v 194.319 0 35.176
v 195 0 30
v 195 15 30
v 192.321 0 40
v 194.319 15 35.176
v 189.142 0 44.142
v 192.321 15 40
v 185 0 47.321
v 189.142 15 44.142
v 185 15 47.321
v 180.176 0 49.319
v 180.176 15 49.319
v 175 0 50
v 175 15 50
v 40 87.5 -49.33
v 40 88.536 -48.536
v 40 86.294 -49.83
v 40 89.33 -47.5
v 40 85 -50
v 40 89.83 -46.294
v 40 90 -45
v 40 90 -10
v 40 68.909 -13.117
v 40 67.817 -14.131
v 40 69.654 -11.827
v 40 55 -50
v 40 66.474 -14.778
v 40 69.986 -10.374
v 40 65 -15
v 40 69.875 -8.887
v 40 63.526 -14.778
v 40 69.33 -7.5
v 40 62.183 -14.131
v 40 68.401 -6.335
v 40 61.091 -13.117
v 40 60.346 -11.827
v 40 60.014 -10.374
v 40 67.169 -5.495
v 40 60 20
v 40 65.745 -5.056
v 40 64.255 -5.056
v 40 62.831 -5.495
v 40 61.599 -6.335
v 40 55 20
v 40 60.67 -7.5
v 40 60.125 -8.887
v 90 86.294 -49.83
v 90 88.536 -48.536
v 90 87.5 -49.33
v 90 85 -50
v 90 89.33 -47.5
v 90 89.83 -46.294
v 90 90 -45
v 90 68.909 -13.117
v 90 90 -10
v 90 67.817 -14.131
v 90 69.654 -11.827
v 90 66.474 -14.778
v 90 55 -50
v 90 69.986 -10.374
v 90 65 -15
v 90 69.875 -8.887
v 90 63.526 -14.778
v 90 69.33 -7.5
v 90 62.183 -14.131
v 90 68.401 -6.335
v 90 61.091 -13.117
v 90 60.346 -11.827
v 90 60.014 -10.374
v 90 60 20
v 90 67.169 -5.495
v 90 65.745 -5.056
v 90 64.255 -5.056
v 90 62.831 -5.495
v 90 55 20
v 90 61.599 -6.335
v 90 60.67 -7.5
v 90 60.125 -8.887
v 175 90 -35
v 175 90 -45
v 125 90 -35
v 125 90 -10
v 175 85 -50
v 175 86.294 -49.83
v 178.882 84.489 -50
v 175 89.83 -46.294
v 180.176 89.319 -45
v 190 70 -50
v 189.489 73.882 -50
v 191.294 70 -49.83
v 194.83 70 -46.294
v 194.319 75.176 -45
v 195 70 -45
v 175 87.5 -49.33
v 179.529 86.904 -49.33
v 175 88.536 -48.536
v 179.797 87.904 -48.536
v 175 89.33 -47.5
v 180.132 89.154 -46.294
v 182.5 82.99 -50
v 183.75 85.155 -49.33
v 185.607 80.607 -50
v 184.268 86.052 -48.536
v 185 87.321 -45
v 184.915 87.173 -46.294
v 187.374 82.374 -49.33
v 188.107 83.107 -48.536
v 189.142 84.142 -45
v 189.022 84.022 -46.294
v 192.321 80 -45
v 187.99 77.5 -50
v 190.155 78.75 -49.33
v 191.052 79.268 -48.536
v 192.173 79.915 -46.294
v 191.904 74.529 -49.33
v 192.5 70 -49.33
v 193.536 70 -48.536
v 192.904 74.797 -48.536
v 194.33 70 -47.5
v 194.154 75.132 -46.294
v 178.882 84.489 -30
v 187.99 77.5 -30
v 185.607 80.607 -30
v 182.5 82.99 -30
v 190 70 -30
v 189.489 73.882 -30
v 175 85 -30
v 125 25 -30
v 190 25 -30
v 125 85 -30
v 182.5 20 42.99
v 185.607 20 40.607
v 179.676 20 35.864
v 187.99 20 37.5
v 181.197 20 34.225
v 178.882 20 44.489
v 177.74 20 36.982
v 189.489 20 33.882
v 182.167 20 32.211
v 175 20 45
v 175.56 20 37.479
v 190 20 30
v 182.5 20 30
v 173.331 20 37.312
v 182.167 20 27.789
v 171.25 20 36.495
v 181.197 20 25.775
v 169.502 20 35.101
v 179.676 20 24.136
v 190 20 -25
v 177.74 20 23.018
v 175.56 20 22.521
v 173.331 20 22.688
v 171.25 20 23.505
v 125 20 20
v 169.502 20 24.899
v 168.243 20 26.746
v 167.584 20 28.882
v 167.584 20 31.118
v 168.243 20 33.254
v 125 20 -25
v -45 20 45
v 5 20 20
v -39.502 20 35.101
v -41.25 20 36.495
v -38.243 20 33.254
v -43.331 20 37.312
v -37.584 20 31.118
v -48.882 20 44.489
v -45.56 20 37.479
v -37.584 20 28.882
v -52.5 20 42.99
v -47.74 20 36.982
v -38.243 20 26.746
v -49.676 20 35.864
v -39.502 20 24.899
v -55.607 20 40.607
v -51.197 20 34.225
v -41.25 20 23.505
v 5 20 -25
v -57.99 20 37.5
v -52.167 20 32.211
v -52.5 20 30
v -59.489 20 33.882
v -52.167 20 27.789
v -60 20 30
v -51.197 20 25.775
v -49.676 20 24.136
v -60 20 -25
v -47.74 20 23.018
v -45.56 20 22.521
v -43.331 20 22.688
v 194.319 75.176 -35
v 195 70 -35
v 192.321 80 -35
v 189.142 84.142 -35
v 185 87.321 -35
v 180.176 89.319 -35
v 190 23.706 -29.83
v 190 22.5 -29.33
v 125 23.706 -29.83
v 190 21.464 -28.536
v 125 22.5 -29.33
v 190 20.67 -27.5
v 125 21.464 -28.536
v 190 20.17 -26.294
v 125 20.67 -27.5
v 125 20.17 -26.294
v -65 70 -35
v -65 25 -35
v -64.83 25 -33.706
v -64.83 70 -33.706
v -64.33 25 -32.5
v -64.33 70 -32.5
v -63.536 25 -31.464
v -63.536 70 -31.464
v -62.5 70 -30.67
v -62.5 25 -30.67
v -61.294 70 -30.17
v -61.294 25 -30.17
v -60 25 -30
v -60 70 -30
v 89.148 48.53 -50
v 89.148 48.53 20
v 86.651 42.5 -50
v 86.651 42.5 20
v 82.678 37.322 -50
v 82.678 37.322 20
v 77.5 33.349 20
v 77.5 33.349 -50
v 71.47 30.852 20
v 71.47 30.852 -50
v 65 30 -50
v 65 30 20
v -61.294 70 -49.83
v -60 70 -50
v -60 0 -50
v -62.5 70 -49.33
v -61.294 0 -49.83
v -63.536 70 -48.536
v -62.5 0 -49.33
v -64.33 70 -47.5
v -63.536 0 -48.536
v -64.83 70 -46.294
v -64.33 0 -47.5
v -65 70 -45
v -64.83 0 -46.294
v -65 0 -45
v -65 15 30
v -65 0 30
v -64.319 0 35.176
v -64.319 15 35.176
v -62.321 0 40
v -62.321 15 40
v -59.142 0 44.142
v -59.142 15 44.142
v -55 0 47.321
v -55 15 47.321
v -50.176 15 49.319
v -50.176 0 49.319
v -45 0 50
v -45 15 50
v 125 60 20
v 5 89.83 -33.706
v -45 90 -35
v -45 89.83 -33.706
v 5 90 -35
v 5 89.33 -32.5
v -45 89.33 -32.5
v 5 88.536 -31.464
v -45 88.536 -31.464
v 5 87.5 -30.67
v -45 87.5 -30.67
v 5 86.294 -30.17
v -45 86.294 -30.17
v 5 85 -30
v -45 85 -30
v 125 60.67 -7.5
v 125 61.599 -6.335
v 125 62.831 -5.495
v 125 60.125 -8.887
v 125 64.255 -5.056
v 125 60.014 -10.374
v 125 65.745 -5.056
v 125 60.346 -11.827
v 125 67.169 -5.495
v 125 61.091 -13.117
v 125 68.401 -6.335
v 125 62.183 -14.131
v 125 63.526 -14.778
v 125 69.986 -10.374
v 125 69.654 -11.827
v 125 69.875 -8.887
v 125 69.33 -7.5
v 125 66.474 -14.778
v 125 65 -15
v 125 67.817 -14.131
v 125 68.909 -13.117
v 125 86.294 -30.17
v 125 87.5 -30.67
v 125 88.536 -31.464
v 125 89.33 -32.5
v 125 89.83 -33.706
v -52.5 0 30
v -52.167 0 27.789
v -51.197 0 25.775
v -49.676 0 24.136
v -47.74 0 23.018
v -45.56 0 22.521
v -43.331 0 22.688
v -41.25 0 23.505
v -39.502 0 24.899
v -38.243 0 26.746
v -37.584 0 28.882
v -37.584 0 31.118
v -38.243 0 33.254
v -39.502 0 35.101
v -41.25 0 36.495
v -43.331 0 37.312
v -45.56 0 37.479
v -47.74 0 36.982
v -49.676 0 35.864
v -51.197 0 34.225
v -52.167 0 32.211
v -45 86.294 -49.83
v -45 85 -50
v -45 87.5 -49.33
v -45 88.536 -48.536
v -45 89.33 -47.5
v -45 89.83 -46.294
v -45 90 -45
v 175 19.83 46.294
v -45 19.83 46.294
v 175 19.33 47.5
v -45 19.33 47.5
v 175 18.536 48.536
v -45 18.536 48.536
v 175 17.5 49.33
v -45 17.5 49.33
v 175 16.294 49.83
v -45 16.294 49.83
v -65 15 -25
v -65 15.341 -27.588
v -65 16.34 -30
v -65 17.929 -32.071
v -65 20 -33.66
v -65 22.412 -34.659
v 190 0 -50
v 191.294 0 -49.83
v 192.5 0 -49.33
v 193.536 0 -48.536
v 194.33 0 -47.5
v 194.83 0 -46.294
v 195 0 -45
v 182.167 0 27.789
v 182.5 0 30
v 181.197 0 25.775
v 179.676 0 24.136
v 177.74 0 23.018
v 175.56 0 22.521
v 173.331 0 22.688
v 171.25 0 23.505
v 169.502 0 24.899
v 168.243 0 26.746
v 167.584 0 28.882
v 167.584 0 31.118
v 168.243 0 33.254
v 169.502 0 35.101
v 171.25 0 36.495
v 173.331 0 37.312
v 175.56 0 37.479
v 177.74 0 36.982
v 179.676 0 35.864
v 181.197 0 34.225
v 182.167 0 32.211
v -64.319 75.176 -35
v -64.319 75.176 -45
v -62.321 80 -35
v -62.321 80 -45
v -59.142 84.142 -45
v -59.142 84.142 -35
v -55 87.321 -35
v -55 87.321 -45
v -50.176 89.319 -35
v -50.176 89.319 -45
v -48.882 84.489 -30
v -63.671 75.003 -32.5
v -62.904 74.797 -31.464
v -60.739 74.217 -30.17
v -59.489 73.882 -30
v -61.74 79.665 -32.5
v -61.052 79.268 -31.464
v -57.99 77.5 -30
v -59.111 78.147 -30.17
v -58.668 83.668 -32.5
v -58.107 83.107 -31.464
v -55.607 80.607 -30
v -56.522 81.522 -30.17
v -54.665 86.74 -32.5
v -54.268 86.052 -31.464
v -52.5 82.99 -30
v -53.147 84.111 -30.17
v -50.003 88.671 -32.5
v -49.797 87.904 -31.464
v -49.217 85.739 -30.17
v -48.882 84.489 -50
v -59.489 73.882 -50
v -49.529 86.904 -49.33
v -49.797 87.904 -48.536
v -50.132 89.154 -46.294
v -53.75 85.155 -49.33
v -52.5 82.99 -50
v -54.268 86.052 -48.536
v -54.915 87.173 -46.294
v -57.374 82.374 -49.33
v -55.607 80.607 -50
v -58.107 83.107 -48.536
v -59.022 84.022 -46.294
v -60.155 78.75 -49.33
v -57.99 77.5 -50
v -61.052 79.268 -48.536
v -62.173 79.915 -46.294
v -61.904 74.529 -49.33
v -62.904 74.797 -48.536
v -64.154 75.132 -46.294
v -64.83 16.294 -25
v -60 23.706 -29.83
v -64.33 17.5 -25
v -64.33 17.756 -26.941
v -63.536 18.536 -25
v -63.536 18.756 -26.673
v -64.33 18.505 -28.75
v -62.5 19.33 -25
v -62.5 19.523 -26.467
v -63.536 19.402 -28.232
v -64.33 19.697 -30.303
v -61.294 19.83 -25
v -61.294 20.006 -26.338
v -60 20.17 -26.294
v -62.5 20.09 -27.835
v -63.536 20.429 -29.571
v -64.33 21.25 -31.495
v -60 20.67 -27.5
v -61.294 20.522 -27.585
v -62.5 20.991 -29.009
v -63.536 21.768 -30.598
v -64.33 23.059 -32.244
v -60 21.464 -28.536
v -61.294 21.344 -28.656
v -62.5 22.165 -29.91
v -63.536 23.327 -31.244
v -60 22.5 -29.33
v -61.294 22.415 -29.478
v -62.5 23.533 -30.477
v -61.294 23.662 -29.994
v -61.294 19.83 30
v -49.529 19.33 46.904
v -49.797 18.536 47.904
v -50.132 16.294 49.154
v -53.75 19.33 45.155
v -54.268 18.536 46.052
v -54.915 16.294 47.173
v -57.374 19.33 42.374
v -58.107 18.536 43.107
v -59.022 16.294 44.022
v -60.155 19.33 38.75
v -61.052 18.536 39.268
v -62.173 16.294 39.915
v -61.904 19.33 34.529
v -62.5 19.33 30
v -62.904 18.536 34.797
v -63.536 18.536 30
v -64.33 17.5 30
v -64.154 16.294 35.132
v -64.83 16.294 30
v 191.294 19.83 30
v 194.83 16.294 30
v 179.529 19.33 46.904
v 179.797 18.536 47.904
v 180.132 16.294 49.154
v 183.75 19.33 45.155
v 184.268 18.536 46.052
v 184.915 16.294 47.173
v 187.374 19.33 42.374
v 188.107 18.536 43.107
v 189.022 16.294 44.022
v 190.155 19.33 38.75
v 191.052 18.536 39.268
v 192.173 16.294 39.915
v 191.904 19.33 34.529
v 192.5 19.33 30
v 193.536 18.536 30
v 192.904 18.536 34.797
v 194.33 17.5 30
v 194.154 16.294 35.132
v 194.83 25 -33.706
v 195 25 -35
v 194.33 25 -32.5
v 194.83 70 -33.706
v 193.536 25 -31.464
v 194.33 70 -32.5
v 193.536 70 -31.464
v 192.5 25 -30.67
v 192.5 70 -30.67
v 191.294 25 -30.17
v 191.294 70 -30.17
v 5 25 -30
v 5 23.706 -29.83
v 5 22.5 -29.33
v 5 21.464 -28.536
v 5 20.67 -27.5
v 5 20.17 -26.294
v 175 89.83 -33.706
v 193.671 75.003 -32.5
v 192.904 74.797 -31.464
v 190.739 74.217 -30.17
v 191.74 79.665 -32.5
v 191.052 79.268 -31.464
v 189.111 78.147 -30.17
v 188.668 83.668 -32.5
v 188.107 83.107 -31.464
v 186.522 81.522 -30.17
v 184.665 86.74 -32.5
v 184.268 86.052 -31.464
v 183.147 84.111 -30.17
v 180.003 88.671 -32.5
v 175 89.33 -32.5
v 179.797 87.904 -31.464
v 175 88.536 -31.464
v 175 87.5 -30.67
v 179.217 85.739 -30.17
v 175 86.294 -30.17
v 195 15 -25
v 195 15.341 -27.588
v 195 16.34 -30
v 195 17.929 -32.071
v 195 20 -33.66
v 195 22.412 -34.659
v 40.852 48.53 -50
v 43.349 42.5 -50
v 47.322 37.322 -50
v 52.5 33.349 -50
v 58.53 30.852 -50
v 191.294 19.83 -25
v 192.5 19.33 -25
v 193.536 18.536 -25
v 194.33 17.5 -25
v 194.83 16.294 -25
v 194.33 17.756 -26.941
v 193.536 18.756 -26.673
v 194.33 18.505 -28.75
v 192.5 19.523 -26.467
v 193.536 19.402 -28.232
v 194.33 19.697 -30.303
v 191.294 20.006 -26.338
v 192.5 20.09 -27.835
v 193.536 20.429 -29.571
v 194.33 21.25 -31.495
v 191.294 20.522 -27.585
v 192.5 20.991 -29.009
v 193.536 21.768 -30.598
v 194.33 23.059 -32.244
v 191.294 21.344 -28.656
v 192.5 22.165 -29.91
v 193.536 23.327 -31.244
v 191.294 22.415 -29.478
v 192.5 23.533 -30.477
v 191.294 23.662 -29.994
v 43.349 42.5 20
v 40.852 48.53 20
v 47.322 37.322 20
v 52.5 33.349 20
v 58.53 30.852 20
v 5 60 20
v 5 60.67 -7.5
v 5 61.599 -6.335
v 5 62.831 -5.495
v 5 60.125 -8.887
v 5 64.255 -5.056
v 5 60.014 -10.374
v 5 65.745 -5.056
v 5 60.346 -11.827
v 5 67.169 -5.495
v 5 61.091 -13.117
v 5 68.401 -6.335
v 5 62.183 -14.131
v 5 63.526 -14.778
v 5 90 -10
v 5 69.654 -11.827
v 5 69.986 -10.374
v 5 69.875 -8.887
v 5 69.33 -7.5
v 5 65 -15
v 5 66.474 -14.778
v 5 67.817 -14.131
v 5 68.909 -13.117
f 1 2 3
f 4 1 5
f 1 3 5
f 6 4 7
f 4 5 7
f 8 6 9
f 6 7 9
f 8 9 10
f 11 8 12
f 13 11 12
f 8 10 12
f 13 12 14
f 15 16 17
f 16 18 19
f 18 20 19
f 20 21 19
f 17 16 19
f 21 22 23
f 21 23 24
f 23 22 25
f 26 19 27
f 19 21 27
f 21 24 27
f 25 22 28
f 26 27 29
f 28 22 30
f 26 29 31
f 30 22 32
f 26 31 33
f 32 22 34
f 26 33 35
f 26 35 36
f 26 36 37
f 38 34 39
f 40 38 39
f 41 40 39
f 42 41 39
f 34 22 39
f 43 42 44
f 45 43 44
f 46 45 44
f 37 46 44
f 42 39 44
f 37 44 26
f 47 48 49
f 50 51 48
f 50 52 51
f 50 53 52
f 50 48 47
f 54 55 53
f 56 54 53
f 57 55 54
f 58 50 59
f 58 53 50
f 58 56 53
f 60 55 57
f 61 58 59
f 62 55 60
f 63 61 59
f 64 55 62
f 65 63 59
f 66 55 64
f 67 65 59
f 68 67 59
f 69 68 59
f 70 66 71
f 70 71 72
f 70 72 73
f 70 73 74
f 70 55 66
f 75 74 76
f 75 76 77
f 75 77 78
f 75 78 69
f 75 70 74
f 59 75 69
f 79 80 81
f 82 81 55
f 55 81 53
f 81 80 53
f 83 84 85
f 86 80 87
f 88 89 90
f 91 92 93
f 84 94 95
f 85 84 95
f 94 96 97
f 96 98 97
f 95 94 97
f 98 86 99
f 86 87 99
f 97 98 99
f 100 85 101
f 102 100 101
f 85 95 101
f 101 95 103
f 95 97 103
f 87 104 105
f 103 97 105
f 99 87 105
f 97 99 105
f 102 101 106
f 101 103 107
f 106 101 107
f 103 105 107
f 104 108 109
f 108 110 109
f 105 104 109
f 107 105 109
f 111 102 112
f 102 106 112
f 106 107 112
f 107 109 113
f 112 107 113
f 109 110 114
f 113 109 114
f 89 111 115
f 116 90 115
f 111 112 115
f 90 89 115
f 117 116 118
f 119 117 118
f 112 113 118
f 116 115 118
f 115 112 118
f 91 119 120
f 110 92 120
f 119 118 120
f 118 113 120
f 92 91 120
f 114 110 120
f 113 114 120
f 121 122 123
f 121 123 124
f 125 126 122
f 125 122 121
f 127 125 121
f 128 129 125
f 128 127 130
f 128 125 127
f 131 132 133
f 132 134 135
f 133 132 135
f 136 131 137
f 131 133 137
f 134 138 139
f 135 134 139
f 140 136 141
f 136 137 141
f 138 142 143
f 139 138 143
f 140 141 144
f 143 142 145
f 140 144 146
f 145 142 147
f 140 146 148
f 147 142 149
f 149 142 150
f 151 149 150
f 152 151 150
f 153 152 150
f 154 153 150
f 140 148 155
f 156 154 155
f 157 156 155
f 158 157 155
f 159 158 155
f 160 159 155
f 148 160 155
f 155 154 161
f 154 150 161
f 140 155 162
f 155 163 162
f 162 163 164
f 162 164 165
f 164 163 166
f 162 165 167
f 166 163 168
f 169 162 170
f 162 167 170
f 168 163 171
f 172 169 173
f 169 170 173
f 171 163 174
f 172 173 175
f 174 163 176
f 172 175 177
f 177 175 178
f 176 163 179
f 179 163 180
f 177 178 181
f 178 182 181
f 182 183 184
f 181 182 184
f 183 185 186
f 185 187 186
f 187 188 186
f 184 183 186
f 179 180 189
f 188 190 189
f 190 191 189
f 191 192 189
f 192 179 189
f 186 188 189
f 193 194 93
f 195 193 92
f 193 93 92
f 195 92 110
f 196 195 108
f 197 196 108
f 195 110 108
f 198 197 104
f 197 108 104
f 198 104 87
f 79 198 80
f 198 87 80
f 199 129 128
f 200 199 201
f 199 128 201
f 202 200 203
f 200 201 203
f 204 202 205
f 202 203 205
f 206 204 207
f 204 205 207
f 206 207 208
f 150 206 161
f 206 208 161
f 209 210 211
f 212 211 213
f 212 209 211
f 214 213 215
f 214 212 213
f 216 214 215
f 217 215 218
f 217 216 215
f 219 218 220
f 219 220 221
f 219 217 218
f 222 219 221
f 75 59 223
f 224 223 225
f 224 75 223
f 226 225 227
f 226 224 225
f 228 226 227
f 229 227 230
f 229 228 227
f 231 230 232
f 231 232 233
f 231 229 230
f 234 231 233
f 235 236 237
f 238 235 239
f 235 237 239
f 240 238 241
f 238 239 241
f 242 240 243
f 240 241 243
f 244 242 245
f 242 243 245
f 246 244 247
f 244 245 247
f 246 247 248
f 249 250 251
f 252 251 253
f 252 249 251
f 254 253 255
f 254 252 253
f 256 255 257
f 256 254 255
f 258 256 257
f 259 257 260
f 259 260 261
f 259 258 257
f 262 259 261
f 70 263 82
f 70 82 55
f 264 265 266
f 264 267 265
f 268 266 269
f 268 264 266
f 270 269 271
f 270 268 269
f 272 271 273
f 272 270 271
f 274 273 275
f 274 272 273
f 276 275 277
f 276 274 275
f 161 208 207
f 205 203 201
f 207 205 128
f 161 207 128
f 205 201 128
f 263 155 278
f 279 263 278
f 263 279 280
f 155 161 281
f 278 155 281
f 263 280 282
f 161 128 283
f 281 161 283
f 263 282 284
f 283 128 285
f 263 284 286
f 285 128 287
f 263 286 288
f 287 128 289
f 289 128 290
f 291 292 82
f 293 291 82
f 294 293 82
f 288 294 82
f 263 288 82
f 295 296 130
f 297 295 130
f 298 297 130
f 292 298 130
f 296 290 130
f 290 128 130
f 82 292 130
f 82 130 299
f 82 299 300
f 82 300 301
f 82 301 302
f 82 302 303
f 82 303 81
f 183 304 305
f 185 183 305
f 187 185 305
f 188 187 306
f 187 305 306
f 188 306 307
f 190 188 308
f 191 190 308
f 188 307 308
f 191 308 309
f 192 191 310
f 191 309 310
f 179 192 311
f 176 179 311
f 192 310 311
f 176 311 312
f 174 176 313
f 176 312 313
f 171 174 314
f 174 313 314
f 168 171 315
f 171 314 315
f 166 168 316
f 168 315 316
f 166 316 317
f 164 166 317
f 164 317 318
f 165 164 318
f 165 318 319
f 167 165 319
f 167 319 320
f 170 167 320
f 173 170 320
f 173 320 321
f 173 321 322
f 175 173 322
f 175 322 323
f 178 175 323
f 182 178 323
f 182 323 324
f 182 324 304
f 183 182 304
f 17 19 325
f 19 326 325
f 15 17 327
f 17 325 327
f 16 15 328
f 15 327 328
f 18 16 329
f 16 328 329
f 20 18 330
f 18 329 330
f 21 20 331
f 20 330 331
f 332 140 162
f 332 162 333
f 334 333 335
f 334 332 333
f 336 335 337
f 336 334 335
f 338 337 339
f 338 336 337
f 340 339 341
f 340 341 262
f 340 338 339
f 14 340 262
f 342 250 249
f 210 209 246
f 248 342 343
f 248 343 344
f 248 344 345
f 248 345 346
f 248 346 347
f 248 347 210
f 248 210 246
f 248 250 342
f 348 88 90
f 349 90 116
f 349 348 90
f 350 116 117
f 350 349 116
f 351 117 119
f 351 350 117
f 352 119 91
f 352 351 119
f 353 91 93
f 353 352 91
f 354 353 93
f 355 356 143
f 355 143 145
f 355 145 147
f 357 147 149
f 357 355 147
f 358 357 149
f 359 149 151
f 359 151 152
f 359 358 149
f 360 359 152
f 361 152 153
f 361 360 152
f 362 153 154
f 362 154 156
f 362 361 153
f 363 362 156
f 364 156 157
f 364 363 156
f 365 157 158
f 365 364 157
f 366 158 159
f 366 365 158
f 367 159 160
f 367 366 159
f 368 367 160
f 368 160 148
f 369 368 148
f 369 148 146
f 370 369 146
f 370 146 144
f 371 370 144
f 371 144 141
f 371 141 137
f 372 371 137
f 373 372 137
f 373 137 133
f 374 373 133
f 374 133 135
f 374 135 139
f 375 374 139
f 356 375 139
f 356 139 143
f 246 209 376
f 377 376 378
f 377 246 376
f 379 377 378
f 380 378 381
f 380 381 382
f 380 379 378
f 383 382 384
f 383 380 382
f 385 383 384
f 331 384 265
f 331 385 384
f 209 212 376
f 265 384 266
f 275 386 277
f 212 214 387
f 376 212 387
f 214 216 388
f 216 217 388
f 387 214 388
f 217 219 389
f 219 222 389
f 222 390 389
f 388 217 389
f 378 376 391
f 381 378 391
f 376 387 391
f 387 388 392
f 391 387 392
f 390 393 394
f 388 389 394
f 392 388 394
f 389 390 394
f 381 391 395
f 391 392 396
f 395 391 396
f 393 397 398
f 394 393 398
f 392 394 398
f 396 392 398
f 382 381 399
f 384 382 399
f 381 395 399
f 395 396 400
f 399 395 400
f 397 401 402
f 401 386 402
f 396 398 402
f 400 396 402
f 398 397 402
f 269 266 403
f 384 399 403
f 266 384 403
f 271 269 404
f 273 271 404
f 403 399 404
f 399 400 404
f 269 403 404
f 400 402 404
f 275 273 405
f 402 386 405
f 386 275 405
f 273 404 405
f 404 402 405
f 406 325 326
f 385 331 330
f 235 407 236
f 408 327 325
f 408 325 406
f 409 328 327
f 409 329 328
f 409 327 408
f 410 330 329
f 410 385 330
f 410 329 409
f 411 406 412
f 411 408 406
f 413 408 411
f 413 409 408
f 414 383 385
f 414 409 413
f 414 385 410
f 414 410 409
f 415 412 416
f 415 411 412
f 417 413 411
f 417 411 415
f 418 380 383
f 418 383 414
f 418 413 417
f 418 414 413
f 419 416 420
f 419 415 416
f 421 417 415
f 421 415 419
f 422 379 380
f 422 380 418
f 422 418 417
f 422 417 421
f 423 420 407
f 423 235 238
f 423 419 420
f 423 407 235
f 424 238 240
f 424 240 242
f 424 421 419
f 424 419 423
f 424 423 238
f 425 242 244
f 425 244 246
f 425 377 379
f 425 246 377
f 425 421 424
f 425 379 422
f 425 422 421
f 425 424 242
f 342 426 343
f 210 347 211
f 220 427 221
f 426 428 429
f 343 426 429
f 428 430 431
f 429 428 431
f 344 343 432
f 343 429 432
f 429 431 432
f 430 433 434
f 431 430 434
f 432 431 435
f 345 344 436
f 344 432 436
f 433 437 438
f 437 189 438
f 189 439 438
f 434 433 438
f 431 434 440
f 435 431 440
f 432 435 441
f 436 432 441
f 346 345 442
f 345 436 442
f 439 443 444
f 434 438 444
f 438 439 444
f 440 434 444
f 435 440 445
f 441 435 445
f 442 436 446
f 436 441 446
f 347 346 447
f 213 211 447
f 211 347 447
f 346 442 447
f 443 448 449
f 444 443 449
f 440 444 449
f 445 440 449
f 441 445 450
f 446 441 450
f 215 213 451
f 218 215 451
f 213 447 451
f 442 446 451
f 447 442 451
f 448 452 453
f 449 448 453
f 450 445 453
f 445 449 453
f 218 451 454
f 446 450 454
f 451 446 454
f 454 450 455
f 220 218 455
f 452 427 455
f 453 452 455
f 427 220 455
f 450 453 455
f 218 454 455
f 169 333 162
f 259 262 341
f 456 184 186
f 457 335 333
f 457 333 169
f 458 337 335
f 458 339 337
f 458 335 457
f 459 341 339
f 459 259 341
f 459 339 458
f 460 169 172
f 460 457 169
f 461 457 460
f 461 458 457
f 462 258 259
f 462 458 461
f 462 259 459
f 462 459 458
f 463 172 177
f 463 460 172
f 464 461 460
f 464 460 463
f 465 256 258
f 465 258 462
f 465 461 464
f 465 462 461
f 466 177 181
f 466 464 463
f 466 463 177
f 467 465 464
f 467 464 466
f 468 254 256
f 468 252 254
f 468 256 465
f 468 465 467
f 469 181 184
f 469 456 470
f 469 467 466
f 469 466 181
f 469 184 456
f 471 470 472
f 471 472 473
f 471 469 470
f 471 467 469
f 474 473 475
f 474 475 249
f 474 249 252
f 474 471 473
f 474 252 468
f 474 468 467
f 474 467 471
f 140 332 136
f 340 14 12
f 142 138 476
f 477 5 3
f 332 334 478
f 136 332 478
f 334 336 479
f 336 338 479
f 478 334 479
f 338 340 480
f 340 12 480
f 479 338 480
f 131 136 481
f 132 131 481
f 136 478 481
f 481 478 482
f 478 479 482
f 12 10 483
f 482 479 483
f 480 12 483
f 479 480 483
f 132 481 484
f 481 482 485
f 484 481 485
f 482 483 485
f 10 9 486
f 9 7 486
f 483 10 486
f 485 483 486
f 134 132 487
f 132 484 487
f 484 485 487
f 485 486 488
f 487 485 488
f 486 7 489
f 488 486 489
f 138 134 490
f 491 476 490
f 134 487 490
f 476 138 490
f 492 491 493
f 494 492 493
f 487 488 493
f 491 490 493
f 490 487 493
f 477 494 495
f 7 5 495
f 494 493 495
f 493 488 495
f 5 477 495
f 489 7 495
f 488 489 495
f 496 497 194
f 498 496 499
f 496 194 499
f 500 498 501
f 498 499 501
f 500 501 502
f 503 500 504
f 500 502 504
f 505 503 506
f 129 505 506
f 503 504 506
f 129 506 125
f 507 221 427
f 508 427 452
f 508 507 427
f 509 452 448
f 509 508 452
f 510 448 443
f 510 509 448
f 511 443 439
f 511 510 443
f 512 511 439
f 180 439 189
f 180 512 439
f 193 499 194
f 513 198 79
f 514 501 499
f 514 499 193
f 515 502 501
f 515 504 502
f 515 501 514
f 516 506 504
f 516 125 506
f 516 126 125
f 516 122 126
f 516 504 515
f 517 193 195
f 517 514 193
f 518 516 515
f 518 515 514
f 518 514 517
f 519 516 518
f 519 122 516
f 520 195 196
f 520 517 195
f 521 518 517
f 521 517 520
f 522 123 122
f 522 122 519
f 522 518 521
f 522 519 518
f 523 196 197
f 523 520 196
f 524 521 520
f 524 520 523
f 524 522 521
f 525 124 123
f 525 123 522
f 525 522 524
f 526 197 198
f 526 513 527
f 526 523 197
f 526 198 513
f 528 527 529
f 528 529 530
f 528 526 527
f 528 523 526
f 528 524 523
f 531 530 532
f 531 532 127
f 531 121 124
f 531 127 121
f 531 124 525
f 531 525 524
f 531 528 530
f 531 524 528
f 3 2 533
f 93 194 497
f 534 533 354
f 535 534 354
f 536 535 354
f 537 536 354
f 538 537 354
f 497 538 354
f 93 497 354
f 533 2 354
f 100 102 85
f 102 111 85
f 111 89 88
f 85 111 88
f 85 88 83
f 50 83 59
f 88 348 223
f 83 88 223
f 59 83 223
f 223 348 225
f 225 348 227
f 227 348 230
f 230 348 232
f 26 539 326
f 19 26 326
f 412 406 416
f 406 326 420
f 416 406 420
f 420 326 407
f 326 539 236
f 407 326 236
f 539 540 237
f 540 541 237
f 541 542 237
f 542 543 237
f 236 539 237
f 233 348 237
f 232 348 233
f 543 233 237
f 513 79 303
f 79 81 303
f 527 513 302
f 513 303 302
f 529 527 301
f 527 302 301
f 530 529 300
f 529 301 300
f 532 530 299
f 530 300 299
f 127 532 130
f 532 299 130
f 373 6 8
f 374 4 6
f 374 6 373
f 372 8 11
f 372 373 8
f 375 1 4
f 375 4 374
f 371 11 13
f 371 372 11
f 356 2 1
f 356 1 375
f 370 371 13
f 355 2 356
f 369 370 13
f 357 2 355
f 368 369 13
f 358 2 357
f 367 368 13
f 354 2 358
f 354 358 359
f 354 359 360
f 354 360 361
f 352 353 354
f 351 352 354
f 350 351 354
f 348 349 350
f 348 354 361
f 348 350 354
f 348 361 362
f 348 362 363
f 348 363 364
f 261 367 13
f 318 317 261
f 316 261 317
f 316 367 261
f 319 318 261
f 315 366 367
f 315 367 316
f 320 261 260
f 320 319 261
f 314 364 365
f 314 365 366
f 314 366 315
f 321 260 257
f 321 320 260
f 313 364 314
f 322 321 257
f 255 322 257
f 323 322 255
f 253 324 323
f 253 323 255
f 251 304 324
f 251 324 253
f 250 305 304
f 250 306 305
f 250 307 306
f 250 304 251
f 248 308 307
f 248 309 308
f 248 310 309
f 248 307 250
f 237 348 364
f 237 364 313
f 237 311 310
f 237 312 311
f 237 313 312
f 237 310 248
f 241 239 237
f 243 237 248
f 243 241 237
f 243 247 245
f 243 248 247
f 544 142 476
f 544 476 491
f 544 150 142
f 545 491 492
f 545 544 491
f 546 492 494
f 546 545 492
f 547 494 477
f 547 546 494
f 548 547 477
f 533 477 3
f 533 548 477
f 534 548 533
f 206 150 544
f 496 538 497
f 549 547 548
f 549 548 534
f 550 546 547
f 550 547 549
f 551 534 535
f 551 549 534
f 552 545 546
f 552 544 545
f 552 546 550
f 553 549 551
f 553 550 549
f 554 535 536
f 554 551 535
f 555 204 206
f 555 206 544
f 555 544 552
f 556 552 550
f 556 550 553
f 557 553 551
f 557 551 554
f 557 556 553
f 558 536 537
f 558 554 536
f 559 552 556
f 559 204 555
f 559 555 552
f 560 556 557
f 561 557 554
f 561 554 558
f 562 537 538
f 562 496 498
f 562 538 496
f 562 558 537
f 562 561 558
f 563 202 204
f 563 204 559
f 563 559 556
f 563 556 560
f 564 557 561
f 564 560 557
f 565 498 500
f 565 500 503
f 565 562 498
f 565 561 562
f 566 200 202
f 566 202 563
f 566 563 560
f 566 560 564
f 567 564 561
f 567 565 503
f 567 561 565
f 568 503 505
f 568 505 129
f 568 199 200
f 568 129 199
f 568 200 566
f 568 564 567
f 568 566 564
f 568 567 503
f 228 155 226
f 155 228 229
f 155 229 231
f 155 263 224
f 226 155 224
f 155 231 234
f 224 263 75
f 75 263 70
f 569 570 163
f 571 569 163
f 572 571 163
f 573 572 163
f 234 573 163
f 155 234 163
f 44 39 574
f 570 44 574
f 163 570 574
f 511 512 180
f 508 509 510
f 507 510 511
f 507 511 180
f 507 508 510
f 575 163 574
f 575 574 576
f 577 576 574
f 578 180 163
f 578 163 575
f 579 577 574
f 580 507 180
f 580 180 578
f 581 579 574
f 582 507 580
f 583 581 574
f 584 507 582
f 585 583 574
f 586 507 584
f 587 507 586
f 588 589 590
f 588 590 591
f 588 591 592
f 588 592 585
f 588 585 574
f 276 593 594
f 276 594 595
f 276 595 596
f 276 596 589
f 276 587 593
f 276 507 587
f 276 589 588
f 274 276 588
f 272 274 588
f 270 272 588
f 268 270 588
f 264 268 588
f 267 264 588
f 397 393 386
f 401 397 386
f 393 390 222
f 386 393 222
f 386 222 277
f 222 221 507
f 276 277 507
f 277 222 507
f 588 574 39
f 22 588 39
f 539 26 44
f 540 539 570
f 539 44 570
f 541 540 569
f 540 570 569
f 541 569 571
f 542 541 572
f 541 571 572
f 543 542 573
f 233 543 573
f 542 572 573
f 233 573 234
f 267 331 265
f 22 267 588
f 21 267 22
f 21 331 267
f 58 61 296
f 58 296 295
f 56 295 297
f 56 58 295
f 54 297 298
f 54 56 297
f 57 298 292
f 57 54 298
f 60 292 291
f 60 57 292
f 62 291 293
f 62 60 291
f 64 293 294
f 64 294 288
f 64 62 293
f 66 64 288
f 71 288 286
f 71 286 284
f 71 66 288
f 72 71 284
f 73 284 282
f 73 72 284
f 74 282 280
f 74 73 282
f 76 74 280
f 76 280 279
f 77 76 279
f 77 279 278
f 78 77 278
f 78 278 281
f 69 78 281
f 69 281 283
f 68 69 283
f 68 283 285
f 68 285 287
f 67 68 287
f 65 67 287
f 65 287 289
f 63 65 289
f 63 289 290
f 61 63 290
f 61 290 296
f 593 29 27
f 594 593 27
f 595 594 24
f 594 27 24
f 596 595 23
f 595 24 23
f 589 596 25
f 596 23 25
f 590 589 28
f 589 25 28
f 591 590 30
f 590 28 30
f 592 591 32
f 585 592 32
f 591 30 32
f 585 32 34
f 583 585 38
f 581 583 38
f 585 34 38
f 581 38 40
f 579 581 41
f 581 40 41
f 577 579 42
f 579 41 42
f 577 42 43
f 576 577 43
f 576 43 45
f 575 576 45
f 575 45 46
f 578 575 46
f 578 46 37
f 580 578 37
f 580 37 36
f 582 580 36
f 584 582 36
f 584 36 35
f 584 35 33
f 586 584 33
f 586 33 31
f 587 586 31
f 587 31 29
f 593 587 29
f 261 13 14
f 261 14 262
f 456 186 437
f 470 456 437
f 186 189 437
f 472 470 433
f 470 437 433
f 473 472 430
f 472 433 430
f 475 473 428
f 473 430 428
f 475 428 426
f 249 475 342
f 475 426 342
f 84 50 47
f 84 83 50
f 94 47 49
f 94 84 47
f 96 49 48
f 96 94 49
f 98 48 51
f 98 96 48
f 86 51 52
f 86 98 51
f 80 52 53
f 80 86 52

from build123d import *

# Parameters (mm, degrees)
SKETCH1_W                  = 130
SKETCH1_H                  = 100
BOSS_EXTRUDE1_DEPTH        = 20
SKETCH2_W                  = 130
SKETCH2_H                  = 20
BOSS_EXTRUDE2_DEPTH        = 70
FILLET1_R                  = 20
SKETCH3_W                  = 60
SKETCH3_H                  = 70
BOSS_EXTRUDE3_DEPTH        = 50
CUT_EXTRUDE1_DEPTH         = 132.244047484
CHAMFER1_SIZE              = 30
F_10_0_10_DIAMETER_HOLE1_D = 10
F_15_0_15_DIAMETER_HOLE1_D = 15
FILLET2_R                  = 5


with BuildPart() as part:
    # Sketch1 → Boss-Extrude1 (new body)
    with BuildSketch(Plane(origin=(0, 0, 0), x_dir=(1, 0, 0), z_dir=(0, 1, 0))):
        Rectangle(SKETCH1_W, SKETCH1_H)
    extrude(amount=BOSS_EXTRUDE1_DEPTH)

    # Sketch2 → Boss-Extrude2 (add)
    with BuildSketch(Plane(origin=(0, 20, 0), x_dir=(1, 0, 0), z_dir=(0, 1, 0))):
        with Locations((0, 40)):
            Rectangle(SKETCH2_W, SKETCH2_H)
    extrude(amount=BOSS_EXTRUDE2_DEPTH)

    # Fillet1
    fillet1_edges = [part.edges().sort_by_distance(p)[0] for p in [
        (-65, 10, 50),
        (-65, 90, -40),
    ]]
    fillet(fillet1_edges, radius=FILLET1_R)

    # Sketch3 → Boss-Extrude3 (add)
    with BuildSketch(Plane.XY.offset(-30)):
        with Locations((35, 55)):
            Rectangle(SKETCH3_W, SKETCH3_H)
    extrude(amount=BOSS_EXTRUDE3_DEPTH)

    # Sketch4 → Cut-Extrude1 (cut, through all)
    with BuildSketch(Plane.XY.offset(20)):
        with BuildLine():
            Line((40, 90), (40, 55))
            ThreePointArc((40, 55), (47.32233047, 37.32233047), (65, 30))
            Line((65, 30), (65, 90))
            Line((65, 90), (40, 90))
        make_face()
    extrude(amount=-CUT_EXTRUDE1_DEPTH, mode=Mode.SUBTRACT)

    # Chamfer1
    chamfer1_edges = [part.edges().sort_by_distance(p)[0] for p in [
        (22.5, 90, 20),
    ]]
    chamfer(chamfer1_edges, length=CHAMFER1_SIZE)

    # Ø10.0 (10) Diameter Hole1 (through all)
    with Locations(Plane.ZY.offset(-5)):
        with Locations((-10, 65)):
            Hole(F_10_0_10_DIAMETER_HOLE1_D / 2)

    # Ø15.0 (15) Diameter Hole1 (through all)
    with Locations(Plane(origin=(0, 20, 0), x_dir=(1, 0, 0), z_dir=(0, 1, 0))):
        with Locations((-45, -30)):
            Hole(F_15_0_15_DIAMETER_HOLE1_D / 2)

    # Fillet2
    fillet2_edges = [part.edges().sort_by_distance(p)[0] for p in [
        (-65, 20, 0),
        (10, 20, 50),
        (-65, 35, -50),
        (-2.5, 90, -50),
        (-20, 90, -30),
        (-65, 45, -30),
        (-59.142135624, 20, 44.142135624),
        (-59.142135624, 84.142135624, -50),
        (-59.142135624, 84.142135624, -30),
        (-30, 20, -30),
    ]]
    fillet(fillet2_edges, radius=FILLET2_R)

    # 鏡射1: part across plane


with BuildPart() as part_1:
    add(part.part)
    add(part.part.mirror(Plane(origin=(65, 20, 50), x_dir=(0, 0, 1), z_dir=(-1, 0, 0))))


solid = part_1.part
